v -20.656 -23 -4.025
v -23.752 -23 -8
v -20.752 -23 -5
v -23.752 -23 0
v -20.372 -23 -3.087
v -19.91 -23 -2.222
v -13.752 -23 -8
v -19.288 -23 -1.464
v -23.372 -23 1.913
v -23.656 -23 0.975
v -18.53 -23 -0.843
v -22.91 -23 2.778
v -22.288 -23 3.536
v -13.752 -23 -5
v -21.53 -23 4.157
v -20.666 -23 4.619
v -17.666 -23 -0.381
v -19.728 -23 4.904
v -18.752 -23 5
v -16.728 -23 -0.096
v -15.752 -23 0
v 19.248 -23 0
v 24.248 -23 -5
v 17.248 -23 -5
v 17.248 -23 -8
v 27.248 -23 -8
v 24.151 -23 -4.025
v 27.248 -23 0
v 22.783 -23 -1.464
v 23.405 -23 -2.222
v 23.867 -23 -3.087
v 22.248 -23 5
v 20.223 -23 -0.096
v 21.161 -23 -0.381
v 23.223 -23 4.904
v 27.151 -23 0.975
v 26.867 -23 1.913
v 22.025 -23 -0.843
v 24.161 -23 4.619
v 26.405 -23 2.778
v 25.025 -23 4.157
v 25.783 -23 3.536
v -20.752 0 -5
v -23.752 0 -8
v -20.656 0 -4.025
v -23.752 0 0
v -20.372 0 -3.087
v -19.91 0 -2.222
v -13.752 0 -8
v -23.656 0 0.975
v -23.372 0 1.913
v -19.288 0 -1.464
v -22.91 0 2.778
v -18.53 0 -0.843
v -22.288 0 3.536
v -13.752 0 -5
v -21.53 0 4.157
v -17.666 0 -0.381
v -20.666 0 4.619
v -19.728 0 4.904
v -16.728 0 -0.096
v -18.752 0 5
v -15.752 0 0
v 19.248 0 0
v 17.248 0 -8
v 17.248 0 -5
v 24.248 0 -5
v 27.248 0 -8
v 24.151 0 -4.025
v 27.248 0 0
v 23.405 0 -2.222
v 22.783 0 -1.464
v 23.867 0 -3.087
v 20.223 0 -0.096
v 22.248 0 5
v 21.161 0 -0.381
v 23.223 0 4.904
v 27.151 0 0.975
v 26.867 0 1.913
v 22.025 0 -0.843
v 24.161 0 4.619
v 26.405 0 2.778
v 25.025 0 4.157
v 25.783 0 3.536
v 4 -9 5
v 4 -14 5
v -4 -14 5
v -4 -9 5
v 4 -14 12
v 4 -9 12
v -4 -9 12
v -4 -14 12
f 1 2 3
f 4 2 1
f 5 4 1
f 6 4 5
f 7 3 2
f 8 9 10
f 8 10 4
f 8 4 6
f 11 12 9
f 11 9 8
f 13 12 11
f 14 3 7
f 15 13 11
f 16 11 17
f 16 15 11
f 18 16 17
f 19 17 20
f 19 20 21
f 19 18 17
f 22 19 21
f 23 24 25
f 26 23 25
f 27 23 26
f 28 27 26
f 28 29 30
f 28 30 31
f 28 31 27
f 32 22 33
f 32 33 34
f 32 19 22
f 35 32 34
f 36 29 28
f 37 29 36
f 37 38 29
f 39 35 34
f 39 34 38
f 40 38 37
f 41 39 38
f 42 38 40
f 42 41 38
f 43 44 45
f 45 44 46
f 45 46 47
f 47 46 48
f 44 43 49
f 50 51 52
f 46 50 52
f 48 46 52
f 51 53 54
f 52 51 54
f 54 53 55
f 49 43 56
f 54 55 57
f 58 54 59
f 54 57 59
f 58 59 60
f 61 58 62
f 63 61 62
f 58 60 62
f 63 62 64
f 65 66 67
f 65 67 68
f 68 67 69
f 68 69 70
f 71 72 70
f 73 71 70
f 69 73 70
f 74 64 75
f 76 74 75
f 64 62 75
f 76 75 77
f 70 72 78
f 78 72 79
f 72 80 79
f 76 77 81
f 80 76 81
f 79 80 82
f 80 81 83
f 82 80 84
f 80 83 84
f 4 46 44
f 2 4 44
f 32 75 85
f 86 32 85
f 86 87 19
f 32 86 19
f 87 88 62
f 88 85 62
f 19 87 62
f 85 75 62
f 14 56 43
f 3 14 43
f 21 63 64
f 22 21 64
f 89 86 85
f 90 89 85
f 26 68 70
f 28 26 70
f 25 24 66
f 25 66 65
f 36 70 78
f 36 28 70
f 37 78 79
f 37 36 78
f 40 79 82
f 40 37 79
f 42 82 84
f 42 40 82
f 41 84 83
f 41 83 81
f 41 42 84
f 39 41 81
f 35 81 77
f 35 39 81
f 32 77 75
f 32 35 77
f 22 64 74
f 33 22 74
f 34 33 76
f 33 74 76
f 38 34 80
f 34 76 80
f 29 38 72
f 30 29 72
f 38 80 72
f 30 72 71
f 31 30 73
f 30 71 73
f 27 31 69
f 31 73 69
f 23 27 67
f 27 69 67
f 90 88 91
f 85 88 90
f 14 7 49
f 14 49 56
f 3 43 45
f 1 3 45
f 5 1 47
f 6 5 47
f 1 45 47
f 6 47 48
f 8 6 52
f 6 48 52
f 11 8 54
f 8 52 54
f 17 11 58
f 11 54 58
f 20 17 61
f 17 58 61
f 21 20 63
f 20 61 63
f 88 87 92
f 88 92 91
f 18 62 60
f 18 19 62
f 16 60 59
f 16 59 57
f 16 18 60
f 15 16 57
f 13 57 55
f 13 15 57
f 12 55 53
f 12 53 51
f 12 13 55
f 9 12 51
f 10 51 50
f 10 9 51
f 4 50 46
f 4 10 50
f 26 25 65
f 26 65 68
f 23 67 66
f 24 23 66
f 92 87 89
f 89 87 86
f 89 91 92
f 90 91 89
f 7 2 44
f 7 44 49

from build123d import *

# Parameters (mm, degrees)
F1_DEPTH = 23
F2_R     = 5
F3_W     = 8
F3_H     = 5
F4_DEPTH = 7


with BuildPart() as f1:
    # F0 (on Front) → F1 (new body)
    with BuildSketch(Plane.XZ):
        with BuildLine():
            ThreePointArc((-20.752427, -5), (-19.287961, -1.464466), (-15.752427, 0))
            Line((-15.752427, 0), (19.247573, 0))
            ThreePointArc((19.247573, 0), (22.783106, -1.464466), (24.247573, -5))
            Line((24.247573, -5), (17.247573, -5))
            Line((17.247573, -5), (17.247573, -8))
            Line((17.247573, -8), (27.247573, -8))
            Line((27.247573, -8), (27.247573, 5))
            Line((27.247573, 5), (-23.752427, 5))
            Line((-23.752427, 5), (-23.752427, -8))
            Line((-23.752427, -8), (-13.752427, -8))
            Line((-13.752427, -8), (-13.752427, -5))
            Line((-13.752427, -5), (-20.752427, -5))
        make_face()
    extrude(amount=F1_DEPTH)

    # F2
    f2_edges = [f1.edges().sort_by_distance(p)[0] for p in [
        (27.247573, -11.5, 5),
        (-23.752427, -11.5, 5),
    ]]
    fillet(f2_edges, radius=F2_R)

    # F3 (on face) → F4 (join)
    with BuildSketch(Plane.XY.offset(5)):
        with Locations((0, -11.5)):
            Rectangle(F3_W, F3_H)
    extrude(amount=F4_DEPTH)


solid = f1.part
